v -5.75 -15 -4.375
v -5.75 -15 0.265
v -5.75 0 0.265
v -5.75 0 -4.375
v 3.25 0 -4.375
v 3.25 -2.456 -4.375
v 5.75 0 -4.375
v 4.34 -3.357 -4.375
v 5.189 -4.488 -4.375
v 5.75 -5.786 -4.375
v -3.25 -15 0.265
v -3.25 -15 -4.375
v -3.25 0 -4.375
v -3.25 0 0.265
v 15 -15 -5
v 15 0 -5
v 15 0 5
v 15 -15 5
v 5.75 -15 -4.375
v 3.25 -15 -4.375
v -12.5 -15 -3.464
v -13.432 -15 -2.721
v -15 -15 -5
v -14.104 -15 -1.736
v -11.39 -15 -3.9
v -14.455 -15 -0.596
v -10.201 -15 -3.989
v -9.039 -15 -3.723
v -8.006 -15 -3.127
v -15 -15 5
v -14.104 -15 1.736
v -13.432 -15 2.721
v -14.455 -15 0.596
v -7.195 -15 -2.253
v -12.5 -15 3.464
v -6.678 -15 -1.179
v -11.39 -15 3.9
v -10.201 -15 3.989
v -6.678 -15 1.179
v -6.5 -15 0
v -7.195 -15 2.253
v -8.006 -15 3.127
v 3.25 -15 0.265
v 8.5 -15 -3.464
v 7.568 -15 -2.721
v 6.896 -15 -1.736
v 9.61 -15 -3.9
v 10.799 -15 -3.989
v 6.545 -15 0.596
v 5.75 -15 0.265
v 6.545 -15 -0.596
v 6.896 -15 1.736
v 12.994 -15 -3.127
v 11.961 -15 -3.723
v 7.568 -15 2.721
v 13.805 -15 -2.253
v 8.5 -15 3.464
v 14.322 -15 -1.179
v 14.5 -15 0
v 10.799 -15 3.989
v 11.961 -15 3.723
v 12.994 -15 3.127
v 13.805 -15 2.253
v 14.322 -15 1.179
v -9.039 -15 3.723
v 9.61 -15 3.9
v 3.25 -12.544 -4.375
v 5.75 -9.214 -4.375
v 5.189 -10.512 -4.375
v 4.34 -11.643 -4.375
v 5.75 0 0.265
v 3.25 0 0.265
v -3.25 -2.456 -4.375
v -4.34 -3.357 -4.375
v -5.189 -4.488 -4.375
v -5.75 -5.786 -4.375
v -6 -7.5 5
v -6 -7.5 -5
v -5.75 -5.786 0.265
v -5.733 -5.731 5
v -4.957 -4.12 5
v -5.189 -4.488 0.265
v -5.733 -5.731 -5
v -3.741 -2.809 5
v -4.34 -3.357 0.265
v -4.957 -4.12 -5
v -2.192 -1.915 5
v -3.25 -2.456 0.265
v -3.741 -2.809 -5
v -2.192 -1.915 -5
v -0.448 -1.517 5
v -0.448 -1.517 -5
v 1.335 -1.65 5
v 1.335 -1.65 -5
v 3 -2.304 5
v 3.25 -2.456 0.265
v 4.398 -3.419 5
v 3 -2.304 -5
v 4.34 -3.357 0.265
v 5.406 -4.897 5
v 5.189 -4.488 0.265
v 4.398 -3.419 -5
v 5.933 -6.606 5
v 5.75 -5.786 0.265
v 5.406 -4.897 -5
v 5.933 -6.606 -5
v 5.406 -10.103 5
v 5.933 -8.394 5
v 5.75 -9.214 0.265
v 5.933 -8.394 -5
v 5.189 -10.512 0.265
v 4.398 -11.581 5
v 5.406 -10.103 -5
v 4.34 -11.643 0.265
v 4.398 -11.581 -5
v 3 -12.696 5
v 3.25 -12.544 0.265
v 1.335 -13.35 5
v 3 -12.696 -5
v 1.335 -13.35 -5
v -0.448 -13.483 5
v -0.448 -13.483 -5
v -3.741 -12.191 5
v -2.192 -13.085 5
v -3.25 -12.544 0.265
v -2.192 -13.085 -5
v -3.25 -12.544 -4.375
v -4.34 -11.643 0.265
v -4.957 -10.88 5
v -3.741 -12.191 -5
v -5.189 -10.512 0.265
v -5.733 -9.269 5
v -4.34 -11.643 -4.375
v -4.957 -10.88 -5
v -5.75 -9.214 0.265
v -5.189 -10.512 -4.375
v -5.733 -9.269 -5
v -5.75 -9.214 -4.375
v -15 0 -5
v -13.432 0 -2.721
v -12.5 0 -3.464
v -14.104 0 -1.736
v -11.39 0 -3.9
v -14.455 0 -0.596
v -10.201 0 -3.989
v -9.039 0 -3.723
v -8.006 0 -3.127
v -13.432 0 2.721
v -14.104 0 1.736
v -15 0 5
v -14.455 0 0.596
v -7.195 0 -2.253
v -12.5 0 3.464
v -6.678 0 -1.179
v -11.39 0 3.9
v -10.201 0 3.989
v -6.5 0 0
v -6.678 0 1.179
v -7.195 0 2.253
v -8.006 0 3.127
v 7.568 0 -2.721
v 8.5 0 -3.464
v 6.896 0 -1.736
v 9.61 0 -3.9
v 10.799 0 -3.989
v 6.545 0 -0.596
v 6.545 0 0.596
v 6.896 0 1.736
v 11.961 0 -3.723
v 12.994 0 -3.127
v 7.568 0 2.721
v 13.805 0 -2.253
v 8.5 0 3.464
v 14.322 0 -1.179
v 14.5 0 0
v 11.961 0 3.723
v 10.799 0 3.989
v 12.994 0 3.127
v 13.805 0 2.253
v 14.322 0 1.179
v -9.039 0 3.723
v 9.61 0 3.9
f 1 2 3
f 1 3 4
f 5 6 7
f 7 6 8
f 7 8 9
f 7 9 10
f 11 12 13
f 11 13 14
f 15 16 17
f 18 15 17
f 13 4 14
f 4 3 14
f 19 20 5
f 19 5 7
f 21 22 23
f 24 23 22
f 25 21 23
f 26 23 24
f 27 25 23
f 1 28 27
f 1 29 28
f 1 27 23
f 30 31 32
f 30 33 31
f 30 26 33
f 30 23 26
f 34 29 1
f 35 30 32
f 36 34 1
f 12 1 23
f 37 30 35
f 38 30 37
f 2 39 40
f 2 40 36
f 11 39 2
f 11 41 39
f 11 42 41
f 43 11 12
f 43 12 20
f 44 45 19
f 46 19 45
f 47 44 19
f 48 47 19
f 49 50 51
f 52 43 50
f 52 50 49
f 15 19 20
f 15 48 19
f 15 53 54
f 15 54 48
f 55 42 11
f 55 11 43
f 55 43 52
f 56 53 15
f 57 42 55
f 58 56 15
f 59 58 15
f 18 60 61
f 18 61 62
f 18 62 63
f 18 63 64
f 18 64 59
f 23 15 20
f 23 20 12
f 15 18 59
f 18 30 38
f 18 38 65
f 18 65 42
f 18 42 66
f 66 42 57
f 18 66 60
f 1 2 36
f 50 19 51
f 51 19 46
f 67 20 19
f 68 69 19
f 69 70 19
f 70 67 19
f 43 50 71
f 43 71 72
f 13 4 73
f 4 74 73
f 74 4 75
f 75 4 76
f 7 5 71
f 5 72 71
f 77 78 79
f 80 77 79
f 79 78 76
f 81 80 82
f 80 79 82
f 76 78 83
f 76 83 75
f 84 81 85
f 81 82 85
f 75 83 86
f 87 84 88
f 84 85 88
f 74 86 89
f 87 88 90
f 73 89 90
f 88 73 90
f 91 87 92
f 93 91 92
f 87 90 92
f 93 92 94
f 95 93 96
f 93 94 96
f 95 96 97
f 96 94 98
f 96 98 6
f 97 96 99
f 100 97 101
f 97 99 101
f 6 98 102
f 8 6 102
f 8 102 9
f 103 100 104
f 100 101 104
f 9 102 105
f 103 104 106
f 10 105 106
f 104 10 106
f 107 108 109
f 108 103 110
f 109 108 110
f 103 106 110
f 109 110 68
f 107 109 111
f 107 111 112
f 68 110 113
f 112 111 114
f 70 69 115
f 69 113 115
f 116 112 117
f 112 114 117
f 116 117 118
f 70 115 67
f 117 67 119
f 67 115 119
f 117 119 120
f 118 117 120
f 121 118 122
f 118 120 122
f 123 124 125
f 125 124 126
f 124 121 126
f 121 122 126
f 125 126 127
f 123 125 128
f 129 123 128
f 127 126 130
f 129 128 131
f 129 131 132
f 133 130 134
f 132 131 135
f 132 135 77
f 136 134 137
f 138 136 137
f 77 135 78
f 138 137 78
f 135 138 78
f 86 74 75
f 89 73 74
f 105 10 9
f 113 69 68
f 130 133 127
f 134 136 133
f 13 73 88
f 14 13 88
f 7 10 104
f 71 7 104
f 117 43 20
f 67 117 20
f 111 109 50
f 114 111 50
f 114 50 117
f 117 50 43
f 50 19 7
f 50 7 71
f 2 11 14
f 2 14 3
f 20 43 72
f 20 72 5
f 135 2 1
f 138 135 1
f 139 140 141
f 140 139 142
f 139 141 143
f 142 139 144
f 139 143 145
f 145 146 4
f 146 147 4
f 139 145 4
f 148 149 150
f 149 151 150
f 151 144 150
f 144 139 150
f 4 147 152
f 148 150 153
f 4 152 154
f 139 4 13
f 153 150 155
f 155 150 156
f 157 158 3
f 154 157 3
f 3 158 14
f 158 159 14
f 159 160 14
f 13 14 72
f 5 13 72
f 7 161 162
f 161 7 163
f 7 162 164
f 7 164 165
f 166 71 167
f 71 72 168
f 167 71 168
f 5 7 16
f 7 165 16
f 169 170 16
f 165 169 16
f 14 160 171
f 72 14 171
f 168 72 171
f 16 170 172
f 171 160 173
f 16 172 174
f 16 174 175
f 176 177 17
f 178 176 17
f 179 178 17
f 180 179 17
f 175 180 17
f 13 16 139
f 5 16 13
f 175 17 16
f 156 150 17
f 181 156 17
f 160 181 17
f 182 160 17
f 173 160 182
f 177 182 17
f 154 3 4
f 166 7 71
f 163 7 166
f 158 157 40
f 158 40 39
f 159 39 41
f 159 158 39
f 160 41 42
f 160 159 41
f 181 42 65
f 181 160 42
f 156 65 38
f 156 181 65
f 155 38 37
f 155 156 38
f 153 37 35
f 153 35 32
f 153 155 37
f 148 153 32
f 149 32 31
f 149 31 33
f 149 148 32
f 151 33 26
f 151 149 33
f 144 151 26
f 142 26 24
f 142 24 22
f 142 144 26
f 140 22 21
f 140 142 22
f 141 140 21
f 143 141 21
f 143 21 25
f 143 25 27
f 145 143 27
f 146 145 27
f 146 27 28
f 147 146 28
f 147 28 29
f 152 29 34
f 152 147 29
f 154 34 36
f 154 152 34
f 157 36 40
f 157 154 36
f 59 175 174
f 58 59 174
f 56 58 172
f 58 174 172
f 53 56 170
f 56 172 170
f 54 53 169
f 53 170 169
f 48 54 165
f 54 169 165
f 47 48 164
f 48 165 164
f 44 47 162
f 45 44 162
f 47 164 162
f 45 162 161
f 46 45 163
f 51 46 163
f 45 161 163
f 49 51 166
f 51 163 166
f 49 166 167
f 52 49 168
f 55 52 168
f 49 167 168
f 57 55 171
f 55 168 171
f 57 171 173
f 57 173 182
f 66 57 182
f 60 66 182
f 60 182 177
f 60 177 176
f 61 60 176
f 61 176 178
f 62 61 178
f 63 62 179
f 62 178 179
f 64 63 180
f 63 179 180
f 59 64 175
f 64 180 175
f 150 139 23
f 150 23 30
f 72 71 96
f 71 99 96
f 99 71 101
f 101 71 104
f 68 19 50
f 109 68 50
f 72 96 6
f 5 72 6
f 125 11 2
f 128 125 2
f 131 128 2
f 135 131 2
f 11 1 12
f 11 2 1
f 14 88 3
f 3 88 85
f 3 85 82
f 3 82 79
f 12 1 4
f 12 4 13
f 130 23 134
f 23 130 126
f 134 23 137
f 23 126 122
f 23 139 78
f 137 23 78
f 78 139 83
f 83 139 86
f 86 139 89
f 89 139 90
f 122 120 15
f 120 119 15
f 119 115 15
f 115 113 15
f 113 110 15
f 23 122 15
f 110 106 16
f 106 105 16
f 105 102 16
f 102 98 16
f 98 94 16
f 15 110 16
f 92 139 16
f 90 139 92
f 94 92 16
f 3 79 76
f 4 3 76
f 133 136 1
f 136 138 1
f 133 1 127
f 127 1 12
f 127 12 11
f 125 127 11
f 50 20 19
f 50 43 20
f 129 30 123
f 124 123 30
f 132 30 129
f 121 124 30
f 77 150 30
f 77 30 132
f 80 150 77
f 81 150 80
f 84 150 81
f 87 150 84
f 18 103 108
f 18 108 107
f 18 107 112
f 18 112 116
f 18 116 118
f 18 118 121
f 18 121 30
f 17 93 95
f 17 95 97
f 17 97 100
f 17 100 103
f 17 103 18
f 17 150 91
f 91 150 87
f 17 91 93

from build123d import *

# Parameters (mm, degrees)
F0_W     = 30
F0_H     = 10
F0_R     = 4
F1_DEPTH = 15
F3_D     = 12
F3_DEPTH = 10
F3_TIP   = 3.6051637142
F5_DEPTH = 25
F6_DEPTH = 15


with BuildPart() as f1:
    # F0 (on Front) → F1 (new body)
    with BuildSketch(Plane.XZ):
        Rectangle(F0_W, F0_H)
        with Locations((-10.5, 0)):
            Circle(F0_R, mode=Mode.SUBTRACT)
        Polygon((6, 0.6794541841), (6, 0), (6, -0.6794541841), (-6, -0.6794541841), (-6, 0), (-6, 0.6794541841), align=None, mode=Mode.SUBTRACT)
        with BuildLine():
            ThreePointArc((6.5, 0), (10.5, 4), (14.5, 0))
            ThreePointArc((14.5, 0), (10.5, -4), (6.5, 0))
        make_face(mode=Mode.SUBTRACT)
        Polygon((6, -0.6794541841), (6, 0), (0, 0), (-6, 0), (-6, -0.6794541841), align=None)
        Polygon((0, 0), (6, 0), (6, 0.6794541841), (-6, 0.6794541841), (-6, 0), align=None)
    extrude(amount=F1_DEPTH)

    # F3
    with Locations(Plane.XY.offset(5)):
        with Locations((0, -7.5)):
            Hole(F3_D / 2, depth=F3_DEPTH)
            with Locations((0, 0, -(F3_DEPTH + F3_TIP / 2))):  # 118° drill point
                Cone(0, F3_D / 2, F3_TIP, mode=Mode.SUBTRACT)

    # F4 (on face) → F5 (cut)
    with BuildSketch(Plane.XZ.offset(15)):
        Polygon((-5.75, -4.375), (-3.25, -4.375), (-3.25, -3.75), (-3.25, -2.5), (-3.25, 0.265), (-5.75, 0.265), align=None)
        Polygon((3.25, -3.75), (3.25, -4.375), (5.75, -4.375), (5.75, 0.265), (3.25, 0.265), (3.25, -2.5), align=None)
    extrude(amount=-F5_DEPTH, mode=Mode.SUBTRACT)


with BuildPart() as f6:
    # F4 (on face) → F6 (new body)
    with BuildSketch(Plane.XZ.offset(15)):
        Polygon((-5.75, -4.375), (-3.25, -4.375), (-3.25, -3.75), (-3.25, -2.5), (-3.25, 0.265), (-5.75, 0.265), align=None)
    extrude(amount=-F6_DEPTH)


with BuildPart() as f6b:
    # F4 (on face) → F6, piece 2 (new body)
    with BuildSketch(Plane.XZ.offset(15)):
        Polygon((3.25, -3.75), (3.25, -4.375), (5.75, -4.375), (5.75, 0.265), (3.25, 0.265), (3.25, -2.5), align=None)
    extrude(amount=-F6_DEPTH)


solid = Compound([f1.part, f6.part, f6b.part])
